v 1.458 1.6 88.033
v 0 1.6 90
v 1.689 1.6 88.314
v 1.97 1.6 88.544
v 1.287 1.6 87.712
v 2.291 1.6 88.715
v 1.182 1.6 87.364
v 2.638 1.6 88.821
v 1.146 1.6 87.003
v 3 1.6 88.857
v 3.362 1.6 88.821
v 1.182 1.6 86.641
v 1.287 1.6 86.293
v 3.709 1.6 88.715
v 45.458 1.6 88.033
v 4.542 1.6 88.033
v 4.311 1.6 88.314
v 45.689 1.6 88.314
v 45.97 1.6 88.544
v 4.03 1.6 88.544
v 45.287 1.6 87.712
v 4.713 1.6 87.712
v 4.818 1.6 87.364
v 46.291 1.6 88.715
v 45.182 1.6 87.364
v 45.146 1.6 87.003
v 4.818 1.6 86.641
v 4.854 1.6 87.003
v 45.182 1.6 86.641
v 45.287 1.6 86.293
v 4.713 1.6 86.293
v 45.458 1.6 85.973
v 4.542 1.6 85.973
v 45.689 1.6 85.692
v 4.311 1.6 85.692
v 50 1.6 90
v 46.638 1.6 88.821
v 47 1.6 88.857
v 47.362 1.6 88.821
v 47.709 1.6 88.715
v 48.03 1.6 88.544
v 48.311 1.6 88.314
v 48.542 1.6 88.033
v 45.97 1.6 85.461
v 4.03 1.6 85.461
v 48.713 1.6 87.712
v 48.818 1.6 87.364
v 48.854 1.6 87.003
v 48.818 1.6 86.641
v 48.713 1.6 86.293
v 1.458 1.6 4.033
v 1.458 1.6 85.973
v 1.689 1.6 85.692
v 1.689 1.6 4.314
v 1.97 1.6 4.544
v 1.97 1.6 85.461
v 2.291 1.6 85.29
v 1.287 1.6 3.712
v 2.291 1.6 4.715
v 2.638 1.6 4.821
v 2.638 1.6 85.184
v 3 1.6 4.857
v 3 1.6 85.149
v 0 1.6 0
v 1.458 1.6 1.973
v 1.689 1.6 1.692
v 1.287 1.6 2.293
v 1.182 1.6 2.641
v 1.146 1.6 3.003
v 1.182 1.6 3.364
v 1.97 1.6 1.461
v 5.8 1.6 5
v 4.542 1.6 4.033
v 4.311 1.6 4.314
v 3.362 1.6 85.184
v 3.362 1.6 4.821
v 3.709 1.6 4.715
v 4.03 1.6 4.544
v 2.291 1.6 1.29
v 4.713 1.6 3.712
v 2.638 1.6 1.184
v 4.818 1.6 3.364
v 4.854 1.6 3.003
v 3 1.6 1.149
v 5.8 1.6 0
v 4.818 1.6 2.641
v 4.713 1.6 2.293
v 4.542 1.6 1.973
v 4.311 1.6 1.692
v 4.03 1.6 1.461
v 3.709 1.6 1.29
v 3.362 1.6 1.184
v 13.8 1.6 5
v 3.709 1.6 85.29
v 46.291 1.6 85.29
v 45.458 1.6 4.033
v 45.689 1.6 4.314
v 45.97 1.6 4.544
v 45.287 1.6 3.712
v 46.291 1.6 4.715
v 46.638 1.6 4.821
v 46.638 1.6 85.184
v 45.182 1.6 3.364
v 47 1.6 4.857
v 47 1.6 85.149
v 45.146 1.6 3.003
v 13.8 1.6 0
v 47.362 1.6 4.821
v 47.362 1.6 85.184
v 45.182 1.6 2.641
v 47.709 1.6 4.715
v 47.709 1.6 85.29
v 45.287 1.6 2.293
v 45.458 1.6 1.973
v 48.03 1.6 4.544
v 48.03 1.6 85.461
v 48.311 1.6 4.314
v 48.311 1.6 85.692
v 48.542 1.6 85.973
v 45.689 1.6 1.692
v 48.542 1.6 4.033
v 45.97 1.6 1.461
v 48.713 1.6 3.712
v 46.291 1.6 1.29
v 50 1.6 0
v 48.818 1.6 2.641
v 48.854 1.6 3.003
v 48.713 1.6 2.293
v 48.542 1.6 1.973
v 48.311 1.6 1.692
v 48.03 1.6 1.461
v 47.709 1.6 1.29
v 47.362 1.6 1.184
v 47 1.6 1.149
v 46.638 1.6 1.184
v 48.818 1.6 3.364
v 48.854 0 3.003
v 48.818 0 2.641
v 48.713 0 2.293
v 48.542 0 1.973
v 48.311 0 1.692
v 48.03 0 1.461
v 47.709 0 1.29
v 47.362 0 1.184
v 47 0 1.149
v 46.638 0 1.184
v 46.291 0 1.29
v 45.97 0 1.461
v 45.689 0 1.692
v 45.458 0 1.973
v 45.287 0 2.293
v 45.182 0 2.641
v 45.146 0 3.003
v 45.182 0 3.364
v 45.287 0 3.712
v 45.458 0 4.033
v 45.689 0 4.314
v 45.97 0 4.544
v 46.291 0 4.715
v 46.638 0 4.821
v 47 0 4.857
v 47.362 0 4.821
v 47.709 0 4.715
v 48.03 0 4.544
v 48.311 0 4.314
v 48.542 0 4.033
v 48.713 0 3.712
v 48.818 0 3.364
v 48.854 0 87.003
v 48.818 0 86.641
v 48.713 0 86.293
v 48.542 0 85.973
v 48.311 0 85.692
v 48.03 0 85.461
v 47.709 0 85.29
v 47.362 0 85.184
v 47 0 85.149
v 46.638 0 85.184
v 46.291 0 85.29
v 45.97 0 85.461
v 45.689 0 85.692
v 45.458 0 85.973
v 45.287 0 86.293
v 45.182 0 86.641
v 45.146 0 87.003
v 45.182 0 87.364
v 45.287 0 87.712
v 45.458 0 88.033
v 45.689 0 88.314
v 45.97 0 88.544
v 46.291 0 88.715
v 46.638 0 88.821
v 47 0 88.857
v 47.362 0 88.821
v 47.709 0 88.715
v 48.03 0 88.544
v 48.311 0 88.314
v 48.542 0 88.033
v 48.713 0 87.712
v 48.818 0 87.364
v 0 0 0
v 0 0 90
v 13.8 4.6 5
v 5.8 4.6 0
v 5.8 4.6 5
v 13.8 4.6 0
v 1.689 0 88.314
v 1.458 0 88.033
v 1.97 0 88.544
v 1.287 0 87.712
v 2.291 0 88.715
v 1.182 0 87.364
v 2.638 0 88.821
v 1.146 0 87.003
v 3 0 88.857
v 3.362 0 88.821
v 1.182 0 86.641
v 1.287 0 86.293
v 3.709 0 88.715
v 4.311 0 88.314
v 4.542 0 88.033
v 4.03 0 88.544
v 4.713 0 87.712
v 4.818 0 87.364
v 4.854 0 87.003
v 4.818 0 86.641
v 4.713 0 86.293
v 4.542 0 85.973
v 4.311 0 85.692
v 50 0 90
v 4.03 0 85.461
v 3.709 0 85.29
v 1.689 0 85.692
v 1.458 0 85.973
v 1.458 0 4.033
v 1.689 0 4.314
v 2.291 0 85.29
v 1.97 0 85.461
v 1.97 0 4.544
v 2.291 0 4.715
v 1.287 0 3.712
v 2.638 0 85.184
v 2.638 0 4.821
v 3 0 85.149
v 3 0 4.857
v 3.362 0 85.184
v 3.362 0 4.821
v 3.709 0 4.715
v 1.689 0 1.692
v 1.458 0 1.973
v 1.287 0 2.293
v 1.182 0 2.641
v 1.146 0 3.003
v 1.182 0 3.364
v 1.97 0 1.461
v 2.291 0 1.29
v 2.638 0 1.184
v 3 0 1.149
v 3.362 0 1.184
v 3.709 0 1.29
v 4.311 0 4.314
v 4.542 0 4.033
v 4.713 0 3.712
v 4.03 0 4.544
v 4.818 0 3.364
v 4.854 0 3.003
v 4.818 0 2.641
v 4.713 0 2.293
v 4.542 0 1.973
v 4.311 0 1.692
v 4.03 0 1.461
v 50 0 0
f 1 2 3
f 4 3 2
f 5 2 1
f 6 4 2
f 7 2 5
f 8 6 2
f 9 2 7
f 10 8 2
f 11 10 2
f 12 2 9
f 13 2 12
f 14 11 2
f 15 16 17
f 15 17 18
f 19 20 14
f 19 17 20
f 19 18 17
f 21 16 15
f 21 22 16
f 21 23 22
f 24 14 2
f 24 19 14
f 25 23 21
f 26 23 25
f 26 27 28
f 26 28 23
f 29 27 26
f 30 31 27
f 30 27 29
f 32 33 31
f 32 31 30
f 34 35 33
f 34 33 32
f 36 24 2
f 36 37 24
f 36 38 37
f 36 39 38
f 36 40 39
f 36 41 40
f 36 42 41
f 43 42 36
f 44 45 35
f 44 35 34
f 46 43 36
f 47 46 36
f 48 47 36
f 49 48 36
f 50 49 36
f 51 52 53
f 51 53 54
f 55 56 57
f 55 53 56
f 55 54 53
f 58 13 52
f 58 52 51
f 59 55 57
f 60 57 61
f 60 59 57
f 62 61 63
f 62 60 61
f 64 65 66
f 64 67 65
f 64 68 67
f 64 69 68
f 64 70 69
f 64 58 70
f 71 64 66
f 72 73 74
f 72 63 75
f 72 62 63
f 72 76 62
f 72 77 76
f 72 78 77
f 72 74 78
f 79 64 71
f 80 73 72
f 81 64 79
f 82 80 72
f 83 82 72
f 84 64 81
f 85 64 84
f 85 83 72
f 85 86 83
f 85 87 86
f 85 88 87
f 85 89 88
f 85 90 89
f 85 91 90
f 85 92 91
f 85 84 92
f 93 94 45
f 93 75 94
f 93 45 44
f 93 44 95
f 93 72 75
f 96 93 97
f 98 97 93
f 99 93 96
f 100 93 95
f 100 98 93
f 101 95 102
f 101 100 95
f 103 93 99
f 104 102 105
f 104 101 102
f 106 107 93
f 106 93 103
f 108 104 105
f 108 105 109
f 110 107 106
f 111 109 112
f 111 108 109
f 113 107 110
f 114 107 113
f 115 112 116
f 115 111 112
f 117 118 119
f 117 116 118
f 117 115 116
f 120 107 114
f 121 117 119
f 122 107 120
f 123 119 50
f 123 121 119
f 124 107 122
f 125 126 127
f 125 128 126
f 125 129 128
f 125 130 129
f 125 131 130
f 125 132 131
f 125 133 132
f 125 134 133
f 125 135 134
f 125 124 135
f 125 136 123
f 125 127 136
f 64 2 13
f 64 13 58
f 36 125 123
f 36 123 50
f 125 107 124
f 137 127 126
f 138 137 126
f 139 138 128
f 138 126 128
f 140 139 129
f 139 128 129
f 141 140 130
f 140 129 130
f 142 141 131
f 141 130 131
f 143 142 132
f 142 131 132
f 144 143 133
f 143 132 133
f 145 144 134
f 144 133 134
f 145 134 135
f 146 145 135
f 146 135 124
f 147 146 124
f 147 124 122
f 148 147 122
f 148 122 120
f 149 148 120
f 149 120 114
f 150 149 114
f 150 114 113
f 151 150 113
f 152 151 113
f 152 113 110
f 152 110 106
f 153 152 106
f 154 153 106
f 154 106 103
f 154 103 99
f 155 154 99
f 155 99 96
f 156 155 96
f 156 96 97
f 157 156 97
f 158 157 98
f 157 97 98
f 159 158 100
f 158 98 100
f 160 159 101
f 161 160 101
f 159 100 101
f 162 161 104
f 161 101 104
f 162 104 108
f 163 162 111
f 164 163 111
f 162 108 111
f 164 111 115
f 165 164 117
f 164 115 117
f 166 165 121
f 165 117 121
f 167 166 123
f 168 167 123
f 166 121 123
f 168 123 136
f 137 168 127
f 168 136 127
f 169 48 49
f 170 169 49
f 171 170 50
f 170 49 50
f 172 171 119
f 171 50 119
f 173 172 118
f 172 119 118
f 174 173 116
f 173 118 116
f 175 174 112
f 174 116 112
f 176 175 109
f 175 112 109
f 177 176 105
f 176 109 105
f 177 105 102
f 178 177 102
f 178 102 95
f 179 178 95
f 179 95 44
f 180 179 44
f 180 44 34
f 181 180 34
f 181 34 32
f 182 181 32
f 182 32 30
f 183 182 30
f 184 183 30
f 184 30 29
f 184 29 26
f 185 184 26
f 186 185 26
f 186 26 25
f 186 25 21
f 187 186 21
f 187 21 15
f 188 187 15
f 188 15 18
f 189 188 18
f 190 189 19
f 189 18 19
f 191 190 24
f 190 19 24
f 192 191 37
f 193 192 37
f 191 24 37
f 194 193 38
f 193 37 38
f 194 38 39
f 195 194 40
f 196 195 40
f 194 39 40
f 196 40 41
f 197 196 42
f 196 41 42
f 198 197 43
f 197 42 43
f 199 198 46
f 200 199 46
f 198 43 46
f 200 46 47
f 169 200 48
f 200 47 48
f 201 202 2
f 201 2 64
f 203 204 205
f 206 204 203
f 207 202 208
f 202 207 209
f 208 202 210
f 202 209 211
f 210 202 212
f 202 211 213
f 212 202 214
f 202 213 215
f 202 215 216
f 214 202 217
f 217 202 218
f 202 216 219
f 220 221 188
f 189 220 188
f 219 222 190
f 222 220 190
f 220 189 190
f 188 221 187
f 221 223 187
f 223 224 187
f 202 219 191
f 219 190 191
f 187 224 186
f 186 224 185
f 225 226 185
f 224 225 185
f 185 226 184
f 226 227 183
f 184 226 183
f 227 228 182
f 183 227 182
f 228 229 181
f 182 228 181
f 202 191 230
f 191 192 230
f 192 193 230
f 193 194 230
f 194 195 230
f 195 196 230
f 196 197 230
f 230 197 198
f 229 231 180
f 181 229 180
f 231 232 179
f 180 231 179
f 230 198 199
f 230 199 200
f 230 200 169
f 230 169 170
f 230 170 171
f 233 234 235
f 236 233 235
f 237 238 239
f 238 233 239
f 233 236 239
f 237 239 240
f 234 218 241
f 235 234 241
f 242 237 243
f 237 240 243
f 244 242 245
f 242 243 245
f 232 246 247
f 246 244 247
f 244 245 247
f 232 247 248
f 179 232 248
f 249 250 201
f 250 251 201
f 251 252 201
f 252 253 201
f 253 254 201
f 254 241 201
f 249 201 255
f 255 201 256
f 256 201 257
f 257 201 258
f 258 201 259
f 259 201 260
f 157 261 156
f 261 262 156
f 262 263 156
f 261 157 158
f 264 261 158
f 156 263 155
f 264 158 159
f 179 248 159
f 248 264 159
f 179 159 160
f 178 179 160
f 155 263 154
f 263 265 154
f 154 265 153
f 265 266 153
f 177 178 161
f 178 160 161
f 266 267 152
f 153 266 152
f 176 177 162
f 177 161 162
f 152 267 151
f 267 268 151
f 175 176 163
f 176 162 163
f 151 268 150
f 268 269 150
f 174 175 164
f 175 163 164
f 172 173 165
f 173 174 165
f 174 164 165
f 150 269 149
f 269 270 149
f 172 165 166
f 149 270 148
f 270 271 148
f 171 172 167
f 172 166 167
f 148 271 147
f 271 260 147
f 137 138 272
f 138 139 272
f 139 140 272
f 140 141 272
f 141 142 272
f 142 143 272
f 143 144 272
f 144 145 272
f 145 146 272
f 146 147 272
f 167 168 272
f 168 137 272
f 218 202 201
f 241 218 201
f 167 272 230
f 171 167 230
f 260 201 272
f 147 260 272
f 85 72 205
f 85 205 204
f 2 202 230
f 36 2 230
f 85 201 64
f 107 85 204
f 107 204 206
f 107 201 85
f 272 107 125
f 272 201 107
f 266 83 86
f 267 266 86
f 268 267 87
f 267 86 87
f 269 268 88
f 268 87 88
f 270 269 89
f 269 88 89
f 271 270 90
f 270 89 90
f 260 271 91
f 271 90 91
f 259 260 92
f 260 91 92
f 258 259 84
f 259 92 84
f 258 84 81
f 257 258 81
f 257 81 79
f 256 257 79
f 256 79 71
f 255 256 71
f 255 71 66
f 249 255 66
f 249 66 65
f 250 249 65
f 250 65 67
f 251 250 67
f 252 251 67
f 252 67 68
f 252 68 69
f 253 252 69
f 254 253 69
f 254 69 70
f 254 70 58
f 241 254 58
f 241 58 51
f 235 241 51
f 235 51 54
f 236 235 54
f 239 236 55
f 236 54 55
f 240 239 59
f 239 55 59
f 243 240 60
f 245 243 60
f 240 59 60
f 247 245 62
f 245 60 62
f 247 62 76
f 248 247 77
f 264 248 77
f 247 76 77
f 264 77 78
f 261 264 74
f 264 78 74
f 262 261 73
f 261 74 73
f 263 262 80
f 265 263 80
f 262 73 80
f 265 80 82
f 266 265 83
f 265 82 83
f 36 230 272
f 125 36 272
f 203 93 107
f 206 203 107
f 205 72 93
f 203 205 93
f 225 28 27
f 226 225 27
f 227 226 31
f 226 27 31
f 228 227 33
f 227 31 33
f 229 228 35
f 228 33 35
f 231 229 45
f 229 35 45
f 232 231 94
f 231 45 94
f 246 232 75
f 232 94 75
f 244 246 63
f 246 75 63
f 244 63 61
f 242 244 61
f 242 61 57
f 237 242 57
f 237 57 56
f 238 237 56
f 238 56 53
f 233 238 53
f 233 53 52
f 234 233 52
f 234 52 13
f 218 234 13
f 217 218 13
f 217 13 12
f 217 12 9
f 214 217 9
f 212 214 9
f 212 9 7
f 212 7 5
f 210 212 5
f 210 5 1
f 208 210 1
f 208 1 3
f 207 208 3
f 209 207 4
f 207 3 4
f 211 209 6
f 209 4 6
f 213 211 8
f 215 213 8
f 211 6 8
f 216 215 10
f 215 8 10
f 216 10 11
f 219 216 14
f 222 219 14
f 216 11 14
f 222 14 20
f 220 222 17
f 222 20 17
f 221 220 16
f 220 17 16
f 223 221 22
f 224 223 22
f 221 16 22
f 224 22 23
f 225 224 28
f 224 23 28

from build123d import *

# Parameters (mm, degrees)
SKETCH3_W           = 50
SKETCH3_H           = 90
BOSS_EXTRUDE2_DEPTH = 1.6
CUT_EXTRUDE1_REACH  = 3.6
SKETCH4_R           = 1.854
SKETCH5_W           = 8
SKETCH5_H           = 5
BOSS_EXTRUDE3_DEPTH = 3


with BuildPart() as part:
    # Sketch3 → Boss-Extrude2 (new body)
    with BuildSketch(Plane(origin=(0, 0, 0), x_dir=(1, 0, 0), z_dir=(0, 1, 0))):
        with Locations((25, -45)):
            Rectangle(SKETCH3_W, SKETCH3_H)
    extrude(amount=BOSS_EXTRUDE2_DEPTH)

    # Sketch4 → Cut-Extrude1 (cut, up to next)
    with BuildSketch(Plane(origin=(0, 1.6, 0), x_dir=(1, 0, 0), z_dir=(0, 1, 0)), mode=Mode.PRIVATE) as cut_extrude1_sk1:
        with Locations((3, -3.002549058)):
            Circle(SKETCH4_R)
    cut_extrude1_tool1 = extrude(cut_extrude1_sk1.sketch, amount=-CUT_EXTRUDE1_REACH, mode=Mode.PRIVATE) & part.part
    add(cut_extrude1_tool1.solids().sort_by_distance((3, 1.6, 3.002549))[0], mode=Mode.SUBTRACT)
    # Sketch4 → Cut-Extrude1 (cut, up to next)
    with BuildSketch(Plane(origin=(0, 1.6, 0), x_dir=(1, 0, 0), z_dir=(0, 1, 0)), mode=Mode.PRIVATE) as cut_extrude1_sk2:
        with Locations((47, -3.002549058)):
            Circle(SKETCH4_R)
    cut_extrude1_tool2 = extrude(cut_extrude1_sk2.sketch, amount=-CUT_EXTRUDE1_REACH, mode=Mode.PRIVATE) & part.part
    add(cut_extrude1_tool2.solids().sort_by_distance((47, 1.6, 3.002549))[0], mode=Mode.SUBTRACT)
    # Sketch4 → Cut-Extrude1 (cut, up to next)
    with BuildSketch(Plane(origin=(0, 1.6, 0), x_dir=(1, 0, 0), z_dir=(0, 1, 0)), mode=Mode.PRIVATE) as cut_extrude1_sk3:
        with Locations((47, -87.002549058)):
            Circle(SKETCH4_R)
    cut_extrude1_tool3 = extrude(cut_extrude1_sk3.sketch, amount=-CUT_EXTRUDE1_REACH, mode=Mode.PRIVATE) & part.part
    add(cut_extrude1_tool3.solids().sort_by_distance((47, 1.6, 87.002549))[0], mode=Mode.SUBTRACT)
    # Sketch4 → Cut-Extrude1 (cut, up to next)
    with BuildSketch(Plane(origin=(0, 1.6, 0), x_dir=(1, 0, 0), z_dir=(0, 1, 0)), mode=Mode.PRIVATE) as cut_extrude1_sk4:
        with Locations((3, -87.002549058)):
            Circle(SKETCH4_R)
    cut_extrude1_tool4 = extrude(cut_extrude1_sk4.sketch, amount=-CUT_EXTRUDE1_REACH, mode=Mode.PRIVATE) & part.part
    add(cut_extrude1_tool4.solids().sort_by_distance((3, 1.6, 87.002549))[0], mode=Mode.SUBTRACT)

    # Sketch5 → Boss-Extrude3 (add)
    with BuildSketch(Plane(origin=(0, 1.6, 0), x_dir=(1, 0, 0), z_dir=(0, 1, 0))):
        with Locations((9.8, -2.5)):
            Rectangle(SKETCH5_W, SKETCH5_H)
    extrude(amount=BOSS_EXTRUDE3_DEPTH)


solid = part.part
